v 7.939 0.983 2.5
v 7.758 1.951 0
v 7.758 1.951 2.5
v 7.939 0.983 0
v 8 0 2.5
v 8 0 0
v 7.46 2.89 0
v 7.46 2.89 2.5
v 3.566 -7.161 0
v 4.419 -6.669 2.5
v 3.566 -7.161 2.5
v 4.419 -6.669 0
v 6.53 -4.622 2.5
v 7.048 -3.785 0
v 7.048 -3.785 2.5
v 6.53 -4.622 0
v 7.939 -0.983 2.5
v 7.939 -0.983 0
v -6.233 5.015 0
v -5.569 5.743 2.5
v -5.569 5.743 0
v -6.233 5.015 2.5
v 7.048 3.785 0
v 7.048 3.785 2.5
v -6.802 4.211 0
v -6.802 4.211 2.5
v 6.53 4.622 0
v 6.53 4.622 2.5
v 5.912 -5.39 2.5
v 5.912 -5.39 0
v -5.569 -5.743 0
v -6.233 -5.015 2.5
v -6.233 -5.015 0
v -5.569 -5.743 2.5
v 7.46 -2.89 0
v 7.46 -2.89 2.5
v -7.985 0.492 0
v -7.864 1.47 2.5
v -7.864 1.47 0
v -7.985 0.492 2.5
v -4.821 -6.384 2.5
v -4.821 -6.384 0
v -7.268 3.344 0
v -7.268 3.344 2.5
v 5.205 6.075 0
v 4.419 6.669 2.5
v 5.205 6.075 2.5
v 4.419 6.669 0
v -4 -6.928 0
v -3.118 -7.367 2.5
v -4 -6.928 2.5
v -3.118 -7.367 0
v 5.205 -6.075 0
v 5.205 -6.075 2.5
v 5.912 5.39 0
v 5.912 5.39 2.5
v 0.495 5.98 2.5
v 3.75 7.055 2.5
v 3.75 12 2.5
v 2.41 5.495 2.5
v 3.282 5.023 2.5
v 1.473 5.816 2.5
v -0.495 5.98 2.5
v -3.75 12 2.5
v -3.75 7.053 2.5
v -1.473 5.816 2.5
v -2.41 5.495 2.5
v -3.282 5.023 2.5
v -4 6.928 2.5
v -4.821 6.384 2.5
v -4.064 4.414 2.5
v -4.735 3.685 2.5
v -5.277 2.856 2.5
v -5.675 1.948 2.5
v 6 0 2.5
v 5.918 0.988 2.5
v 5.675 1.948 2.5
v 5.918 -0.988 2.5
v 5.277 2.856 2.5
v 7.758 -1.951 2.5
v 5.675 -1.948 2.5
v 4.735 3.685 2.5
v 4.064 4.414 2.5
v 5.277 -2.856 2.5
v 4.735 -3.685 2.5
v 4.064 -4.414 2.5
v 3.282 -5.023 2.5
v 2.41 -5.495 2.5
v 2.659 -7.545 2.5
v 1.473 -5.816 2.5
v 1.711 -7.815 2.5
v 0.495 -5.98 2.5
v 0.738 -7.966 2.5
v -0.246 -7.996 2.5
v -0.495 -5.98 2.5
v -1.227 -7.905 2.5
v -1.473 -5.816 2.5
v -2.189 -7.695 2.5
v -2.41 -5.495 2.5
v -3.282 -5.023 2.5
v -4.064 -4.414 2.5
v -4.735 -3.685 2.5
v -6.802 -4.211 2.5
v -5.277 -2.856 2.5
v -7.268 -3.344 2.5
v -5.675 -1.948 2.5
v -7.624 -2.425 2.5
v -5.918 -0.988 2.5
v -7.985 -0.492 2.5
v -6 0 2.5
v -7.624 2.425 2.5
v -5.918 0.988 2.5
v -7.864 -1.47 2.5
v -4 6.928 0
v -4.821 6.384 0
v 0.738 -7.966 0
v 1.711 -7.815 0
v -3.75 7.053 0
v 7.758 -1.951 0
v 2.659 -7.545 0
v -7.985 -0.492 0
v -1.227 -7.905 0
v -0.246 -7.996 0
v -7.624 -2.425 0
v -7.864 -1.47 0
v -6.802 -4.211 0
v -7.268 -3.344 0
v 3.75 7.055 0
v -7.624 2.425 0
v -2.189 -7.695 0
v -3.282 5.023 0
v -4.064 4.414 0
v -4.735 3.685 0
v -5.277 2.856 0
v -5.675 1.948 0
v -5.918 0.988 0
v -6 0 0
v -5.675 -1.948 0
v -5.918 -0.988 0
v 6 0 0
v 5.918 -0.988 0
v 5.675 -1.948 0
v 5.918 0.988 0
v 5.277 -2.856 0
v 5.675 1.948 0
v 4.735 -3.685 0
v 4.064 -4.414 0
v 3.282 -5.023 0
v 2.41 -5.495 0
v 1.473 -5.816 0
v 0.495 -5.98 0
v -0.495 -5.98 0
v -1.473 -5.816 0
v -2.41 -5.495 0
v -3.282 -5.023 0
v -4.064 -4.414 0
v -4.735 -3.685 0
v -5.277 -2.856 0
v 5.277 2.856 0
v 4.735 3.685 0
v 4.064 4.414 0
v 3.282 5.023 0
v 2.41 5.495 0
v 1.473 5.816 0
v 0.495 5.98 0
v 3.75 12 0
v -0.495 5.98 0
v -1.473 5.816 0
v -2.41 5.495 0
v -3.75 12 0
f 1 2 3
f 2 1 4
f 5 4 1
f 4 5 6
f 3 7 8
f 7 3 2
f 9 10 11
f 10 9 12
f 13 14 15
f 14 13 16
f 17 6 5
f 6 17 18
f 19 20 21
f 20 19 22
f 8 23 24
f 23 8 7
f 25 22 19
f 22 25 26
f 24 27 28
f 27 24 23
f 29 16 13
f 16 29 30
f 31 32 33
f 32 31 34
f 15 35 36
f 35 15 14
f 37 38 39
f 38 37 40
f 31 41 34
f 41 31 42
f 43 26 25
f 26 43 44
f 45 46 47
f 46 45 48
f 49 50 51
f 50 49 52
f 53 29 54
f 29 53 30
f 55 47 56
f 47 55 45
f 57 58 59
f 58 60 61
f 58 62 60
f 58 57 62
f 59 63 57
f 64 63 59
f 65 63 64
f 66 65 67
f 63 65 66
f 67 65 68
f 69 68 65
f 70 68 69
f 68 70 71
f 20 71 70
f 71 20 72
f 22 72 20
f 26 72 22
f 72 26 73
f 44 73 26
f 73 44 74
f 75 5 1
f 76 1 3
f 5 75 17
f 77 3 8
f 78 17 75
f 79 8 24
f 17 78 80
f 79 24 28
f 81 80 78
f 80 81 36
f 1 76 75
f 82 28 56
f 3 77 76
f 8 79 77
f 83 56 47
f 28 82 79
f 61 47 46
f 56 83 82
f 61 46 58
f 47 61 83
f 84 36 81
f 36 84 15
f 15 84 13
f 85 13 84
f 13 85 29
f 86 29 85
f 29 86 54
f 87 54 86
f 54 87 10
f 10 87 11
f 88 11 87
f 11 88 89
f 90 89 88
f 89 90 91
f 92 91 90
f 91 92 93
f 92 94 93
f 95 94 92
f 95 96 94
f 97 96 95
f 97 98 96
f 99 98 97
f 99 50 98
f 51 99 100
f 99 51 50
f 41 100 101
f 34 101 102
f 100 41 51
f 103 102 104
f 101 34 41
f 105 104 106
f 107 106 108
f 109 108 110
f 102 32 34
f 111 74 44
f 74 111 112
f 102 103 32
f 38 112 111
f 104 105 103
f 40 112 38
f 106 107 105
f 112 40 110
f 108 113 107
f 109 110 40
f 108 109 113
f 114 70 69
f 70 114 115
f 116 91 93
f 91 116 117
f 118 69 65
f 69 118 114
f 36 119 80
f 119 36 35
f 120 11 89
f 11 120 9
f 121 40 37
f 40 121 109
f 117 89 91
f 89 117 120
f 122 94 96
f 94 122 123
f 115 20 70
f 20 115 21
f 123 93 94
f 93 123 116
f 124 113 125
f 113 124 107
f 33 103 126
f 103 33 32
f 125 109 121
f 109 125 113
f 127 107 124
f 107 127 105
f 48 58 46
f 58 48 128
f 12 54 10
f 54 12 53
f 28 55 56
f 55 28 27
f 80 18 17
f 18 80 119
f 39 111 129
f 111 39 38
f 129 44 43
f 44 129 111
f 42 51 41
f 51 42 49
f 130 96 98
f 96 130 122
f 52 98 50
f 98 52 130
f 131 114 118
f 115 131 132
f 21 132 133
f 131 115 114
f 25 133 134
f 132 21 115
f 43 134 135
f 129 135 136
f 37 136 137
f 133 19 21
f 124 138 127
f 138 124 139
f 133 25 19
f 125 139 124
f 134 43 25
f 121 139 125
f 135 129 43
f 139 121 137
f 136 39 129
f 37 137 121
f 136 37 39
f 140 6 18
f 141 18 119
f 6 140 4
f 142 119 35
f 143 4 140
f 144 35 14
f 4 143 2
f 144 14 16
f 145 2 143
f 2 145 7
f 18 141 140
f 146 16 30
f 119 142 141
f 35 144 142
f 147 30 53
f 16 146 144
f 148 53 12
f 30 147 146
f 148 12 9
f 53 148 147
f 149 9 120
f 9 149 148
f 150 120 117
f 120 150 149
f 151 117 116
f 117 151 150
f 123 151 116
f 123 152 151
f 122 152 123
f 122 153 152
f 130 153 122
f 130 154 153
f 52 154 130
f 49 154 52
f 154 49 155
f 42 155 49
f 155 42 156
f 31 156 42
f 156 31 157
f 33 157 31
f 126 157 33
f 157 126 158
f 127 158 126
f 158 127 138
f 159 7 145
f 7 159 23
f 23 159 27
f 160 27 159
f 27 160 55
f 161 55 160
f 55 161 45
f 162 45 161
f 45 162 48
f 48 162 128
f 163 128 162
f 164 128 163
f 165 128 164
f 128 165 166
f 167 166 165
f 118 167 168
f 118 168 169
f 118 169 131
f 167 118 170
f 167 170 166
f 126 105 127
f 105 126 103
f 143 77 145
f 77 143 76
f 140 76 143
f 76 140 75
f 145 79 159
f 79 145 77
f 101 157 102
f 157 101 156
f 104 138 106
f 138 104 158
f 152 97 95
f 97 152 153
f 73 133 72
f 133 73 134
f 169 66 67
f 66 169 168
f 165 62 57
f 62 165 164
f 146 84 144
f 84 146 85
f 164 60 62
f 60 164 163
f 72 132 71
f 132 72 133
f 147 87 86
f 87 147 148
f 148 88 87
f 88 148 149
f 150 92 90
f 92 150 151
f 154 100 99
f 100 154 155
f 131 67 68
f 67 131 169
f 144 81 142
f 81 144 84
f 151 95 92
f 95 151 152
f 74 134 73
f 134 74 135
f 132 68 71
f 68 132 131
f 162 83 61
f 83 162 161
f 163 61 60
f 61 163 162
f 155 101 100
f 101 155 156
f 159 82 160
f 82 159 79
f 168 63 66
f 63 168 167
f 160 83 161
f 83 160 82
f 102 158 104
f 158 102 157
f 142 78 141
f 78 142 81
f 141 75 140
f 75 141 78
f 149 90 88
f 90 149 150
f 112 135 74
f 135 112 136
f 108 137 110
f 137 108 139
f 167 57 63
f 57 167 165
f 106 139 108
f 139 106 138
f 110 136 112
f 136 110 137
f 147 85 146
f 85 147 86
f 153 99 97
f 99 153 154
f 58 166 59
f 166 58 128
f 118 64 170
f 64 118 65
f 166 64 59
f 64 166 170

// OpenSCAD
$fa=4;
$fs=1;

// to hold a laser diode. a replacement part for my micoslice v2.0

union(){
	difference() {
		cylinder(r=8, h = 2.5);
		translate([0,0,-0.1]) cylinder(r=6, h = 2.7);
	}
	translate([-7.5/2,6,0]) cube([7.5,6,2.5]);
}
